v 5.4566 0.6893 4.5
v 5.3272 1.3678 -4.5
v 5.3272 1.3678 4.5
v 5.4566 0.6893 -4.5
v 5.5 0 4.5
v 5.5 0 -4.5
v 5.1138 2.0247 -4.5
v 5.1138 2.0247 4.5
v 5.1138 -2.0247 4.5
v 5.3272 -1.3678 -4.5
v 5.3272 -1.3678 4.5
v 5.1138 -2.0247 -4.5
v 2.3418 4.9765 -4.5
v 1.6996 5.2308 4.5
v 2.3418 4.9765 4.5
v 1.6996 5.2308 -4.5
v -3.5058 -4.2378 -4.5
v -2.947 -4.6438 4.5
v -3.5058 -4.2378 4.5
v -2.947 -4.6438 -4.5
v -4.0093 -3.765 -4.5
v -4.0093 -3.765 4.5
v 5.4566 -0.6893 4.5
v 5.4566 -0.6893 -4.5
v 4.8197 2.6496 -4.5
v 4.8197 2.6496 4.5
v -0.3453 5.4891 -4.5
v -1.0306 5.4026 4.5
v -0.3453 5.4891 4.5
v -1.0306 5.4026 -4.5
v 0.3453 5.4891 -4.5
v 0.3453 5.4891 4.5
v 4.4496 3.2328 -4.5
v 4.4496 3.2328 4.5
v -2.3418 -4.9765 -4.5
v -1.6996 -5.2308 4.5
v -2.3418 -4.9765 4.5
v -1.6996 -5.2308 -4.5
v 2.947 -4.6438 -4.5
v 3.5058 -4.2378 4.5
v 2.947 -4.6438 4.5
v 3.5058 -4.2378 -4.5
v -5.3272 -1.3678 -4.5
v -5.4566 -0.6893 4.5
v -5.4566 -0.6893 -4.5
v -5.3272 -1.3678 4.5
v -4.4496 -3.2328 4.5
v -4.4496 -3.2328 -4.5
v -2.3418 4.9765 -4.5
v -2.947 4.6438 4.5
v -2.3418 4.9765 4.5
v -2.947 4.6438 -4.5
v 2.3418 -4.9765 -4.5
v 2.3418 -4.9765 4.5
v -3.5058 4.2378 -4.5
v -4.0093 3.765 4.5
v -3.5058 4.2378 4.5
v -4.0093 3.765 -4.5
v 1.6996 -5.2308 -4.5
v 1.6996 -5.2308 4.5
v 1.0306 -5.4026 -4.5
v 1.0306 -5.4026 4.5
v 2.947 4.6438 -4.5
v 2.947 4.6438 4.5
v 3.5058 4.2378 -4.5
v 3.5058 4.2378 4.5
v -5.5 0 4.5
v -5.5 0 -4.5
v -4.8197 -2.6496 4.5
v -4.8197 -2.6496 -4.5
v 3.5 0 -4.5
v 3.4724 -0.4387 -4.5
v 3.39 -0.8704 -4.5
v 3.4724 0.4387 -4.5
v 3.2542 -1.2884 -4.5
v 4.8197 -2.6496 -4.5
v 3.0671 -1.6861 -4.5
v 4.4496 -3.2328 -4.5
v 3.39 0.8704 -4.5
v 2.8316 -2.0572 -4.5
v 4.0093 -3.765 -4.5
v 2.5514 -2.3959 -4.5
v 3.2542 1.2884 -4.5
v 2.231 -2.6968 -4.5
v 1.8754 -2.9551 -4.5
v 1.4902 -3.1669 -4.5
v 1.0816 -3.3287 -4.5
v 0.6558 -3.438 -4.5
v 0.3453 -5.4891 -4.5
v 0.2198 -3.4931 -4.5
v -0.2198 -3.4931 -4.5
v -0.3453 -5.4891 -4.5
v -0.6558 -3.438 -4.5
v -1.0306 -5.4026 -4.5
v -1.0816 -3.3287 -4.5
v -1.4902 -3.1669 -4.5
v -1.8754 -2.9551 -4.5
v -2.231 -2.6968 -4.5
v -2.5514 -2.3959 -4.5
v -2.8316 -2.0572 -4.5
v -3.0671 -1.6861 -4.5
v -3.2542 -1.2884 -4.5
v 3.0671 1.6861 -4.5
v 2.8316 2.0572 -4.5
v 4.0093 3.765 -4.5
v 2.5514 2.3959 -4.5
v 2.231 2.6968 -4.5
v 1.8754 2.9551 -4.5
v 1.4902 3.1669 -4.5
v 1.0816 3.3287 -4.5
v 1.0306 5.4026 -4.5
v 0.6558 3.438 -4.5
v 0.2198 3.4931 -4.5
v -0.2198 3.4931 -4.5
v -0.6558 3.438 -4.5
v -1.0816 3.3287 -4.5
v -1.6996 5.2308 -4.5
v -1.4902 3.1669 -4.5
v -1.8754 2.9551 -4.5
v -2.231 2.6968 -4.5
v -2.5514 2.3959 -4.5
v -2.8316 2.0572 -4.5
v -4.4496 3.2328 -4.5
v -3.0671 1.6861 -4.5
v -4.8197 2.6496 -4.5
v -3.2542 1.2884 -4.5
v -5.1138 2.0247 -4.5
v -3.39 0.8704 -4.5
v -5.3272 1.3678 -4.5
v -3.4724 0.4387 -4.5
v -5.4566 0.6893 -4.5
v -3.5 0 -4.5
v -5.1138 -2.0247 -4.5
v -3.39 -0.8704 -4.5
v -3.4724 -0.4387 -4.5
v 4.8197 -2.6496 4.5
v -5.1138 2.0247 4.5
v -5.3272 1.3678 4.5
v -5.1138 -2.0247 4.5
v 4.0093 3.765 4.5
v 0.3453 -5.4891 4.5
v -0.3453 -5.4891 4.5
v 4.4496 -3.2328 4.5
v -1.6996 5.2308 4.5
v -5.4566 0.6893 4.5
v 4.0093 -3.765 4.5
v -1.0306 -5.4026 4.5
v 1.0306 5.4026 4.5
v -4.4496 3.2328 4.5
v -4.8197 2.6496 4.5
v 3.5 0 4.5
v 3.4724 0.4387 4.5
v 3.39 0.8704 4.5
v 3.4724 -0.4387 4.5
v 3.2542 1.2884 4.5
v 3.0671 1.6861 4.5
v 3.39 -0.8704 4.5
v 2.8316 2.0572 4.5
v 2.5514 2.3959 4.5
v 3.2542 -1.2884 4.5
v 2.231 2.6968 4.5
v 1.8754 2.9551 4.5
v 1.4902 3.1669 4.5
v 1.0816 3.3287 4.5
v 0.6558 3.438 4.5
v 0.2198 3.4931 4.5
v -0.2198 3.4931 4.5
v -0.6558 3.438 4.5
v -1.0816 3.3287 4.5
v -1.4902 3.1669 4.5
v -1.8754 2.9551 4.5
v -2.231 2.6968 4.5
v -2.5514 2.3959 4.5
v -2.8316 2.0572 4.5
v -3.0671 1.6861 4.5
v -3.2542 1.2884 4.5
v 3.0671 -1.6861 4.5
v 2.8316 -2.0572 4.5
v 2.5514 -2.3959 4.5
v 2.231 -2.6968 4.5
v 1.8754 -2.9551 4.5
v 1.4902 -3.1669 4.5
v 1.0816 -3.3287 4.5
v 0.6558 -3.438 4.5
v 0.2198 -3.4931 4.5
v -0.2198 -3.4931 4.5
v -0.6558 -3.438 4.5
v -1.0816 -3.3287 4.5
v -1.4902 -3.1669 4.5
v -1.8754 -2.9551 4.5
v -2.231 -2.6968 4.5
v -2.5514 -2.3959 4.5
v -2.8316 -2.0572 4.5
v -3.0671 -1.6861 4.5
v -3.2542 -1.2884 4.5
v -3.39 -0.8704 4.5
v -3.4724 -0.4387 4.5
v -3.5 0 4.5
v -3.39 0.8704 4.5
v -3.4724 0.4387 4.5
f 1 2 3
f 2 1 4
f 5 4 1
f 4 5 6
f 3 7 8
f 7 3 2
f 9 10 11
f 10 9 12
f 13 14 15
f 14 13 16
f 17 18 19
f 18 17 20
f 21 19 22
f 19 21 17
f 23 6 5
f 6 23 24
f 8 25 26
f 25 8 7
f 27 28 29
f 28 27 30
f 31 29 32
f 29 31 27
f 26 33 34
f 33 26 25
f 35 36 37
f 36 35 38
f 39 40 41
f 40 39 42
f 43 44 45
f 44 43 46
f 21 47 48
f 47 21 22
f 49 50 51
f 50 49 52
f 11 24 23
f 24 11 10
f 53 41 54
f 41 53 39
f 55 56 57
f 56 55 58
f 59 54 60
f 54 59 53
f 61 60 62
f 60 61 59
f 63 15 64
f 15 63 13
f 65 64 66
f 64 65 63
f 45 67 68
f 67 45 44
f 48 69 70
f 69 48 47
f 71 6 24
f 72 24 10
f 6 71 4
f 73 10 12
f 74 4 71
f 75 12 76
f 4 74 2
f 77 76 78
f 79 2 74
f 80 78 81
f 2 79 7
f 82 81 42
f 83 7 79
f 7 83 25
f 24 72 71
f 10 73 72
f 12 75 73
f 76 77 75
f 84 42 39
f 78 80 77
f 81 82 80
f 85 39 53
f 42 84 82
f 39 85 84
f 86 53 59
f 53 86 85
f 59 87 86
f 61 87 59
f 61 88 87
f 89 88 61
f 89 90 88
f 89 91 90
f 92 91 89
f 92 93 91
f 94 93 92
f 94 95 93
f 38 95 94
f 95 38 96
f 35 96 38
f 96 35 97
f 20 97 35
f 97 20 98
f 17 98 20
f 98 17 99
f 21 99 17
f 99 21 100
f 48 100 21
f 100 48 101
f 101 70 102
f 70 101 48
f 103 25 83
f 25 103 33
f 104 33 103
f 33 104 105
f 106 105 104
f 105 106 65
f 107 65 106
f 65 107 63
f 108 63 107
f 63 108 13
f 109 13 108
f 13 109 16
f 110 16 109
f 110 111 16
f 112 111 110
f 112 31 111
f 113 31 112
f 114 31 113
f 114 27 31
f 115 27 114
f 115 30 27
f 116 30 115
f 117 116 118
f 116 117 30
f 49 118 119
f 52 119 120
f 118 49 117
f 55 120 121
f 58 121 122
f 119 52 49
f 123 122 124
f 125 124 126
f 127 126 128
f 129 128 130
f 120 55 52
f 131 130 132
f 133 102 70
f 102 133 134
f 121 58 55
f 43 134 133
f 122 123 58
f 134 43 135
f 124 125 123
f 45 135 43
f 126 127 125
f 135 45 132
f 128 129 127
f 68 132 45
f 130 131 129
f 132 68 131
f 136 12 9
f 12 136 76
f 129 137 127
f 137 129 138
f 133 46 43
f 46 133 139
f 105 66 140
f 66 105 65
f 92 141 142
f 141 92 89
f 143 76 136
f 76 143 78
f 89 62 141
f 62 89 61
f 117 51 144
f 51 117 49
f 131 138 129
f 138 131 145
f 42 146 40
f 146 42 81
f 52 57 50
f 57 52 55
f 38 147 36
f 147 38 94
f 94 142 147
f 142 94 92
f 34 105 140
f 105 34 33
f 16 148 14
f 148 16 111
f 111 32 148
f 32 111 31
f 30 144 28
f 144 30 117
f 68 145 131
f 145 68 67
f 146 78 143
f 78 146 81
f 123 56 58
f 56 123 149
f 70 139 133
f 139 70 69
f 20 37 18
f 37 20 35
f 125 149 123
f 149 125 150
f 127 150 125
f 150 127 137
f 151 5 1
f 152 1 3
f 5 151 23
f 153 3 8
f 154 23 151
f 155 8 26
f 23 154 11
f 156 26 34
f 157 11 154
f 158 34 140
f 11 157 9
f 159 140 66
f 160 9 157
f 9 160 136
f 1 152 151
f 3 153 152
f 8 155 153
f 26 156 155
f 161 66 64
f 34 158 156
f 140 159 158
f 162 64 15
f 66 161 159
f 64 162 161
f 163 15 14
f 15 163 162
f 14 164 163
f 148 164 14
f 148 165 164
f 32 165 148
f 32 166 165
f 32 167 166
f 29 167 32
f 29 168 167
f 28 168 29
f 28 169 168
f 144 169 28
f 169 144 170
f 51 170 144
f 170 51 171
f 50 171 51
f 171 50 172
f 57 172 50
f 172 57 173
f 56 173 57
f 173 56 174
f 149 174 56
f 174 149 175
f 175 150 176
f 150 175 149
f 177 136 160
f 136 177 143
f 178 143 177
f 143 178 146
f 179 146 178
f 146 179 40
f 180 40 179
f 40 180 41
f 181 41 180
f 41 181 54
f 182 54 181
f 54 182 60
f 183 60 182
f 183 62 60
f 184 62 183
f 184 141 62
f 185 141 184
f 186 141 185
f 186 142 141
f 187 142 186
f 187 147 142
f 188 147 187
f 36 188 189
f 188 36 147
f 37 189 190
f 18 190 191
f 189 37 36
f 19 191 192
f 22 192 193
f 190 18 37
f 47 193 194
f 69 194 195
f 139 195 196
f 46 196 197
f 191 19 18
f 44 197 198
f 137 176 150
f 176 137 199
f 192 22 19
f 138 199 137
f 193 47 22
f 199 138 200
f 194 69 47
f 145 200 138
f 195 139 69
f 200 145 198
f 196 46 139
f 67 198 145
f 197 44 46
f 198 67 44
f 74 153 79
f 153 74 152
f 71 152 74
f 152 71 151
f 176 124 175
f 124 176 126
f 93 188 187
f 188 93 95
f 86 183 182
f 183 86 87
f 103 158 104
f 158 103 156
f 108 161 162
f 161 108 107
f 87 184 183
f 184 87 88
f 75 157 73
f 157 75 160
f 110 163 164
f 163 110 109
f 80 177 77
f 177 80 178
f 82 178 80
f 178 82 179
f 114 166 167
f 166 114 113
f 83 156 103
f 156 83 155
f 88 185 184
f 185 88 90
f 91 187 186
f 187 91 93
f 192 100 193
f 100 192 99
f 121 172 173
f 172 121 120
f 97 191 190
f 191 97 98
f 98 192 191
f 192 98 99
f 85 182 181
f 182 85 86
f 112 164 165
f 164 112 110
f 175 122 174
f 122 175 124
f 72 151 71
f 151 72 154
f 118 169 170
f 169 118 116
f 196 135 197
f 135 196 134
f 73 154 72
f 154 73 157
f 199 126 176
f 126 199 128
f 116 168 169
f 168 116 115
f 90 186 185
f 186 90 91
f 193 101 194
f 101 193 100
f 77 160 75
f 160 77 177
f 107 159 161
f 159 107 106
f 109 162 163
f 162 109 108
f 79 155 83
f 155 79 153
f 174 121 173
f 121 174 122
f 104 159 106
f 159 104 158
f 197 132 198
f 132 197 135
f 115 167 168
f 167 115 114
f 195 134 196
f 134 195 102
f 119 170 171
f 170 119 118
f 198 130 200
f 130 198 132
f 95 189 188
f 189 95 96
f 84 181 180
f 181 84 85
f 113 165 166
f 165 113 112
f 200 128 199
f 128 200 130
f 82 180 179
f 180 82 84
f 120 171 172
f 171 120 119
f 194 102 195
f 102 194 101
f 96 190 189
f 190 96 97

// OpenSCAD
$fn = 50;


difference() {
	union() {
		translate(v = [0, 0, -4.5000000000]) {
			cylinder(h = 9, r = 5.5000000000);
		}
	}
	union() {
		translate(v = [0, 0, -100.0000000000]) {
			cylinder(h = 200, r = 3.5000000000);
		}
	}
}
